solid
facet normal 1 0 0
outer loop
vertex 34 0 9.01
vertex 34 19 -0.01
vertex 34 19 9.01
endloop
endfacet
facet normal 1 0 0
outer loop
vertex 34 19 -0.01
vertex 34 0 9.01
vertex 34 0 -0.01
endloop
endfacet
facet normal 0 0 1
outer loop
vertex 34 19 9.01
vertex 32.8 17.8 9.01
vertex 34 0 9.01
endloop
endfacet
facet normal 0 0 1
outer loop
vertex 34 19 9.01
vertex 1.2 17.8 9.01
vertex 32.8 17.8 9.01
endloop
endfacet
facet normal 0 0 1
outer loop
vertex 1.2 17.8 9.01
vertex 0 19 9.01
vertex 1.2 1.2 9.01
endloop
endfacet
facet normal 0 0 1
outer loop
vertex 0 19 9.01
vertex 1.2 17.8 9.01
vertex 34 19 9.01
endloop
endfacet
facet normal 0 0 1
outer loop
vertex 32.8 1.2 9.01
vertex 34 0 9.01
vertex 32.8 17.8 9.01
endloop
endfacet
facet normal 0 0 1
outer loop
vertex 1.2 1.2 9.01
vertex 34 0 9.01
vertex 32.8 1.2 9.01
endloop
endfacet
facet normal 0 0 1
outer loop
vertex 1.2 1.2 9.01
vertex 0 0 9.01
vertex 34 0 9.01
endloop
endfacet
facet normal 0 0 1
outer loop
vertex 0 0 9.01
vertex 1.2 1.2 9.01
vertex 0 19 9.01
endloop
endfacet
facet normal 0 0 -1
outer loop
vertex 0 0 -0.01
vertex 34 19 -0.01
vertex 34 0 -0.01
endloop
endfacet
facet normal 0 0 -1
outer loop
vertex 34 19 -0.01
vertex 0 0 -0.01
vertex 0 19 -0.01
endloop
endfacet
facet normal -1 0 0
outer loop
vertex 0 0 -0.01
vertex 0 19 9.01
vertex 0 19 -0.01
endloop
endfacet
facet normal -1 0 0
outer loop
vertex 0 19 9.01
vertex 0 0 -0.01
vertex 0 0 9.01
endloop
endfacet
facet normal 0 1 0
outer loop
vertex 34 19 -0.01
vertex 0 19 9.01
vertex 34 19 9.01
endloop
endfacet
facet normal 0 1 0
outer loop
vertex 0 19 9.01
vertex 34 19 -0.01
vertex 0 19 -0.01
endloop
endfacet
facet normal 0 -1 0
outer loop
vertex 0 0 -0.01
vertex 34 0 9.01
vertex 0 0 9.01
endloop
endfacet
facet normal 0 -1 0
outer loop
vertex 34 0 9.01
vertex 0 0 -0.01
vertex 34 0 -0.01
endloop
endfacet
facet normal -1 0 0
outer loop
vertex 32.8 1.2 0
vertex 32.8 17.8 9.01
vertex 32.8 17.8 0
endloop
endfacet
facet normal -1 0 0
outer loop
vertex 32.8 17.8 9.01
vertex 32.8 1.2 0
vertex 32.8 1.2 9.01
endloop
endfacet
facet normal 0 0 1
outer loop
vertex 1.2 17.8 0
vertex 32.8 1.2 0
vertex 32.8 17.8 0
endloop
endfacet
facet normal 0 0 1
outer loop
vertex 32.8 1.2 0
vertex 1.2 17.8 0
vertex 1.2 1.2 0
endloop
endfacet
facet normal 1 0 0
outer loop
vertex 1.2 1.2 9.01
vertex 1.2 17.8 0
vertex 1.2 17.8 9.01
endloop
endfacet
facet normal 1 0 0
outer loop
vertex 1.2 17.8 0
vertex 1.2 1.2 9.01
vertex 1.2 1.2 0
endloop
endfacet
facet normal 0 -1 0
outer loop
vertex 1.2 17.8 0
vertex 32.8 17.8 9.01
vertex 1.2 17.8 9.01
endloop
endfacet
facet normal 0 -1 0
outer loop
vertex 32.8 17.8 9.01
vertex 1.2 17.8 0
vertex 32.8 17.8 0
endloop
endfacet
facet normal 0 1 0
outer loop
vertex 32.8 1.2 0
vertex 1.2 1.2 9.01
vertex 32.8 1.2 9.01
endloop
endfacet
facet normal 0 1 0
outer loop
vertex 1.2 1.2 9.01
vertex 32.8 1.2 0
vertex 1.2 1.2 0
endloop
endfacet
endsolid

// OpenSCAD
// file: ../Base/Boxes.scad
// Fischertechnik Box Foundation
// Pre-designed Boxes

use <Constants.scad>

include <PlacementOptions.scad>

box190Width = 190;
box190Depth = 130;
box130Width = 130;
box130Depth = 95;
boxUsageHeight = 33.9;
boxWallThickness = 2.4;
boxBaseThickness = 1.0;

// getBoxWallThickness()
// Gets the wall thickness of a Fischertechnik Box

function getBoxWallThickness() = boxWallThickness;

// Gets the usable height of a fischertechnik box
function getBoxUsageHeight() = boxUsageHeight;

// Gets the thickness of the Fischertechnik box base.
function getBoxBaseThickness() = boxBaseThickness;

// Gets the usable inner space of a Box 190 as an x/y-list
function getBox190Space() = [
    box190Width - 2*getBoxWallThickness(), 
    box190Depth - 2*getBoxWallThickness() ];

// Imports the Fischertechnik empty box 130x190 mm and places it at position 0,0
// 190x130 are the outer sizes, the inner space is slightly smaller. Use getBox190Space() to get the inner sizes.
// This module needs the STL file "Fischertechnik Box 130x190.stl" in the library path.
// The box is positioned that the usable inner space is at the 0,0,0 position. The

module Box190() {
    translate([-getBoxWallThickness(),-getBoxWallThickness(),-getBoxBaseThickness()])
        import("Fischertechnik Box 130x190.stl", convexity=3);
}

// Gets the usable inner space of a Box 130 as an x/y-list
function getBox130Space() = [
    box130Width - 2*getBoxWallThickness(), 
    box130Depth - 2*getBoxWallThickness() ];

// Imports the Fischertechnik empty box 95x130 mm and places it at position 0,0
// 190x130 are the outer sizes, the inner space is slightly smaller. Use getBox190Space() to get the inner sizes.
// This module needs the STL file "Fischertechnik Box 95x130.stl" in the library path.
// The box is positioned that the usable inner space is at the 0,0,0 position. The

module Box130() {
    translate([-getBoxWallThickness(),-getBoxWallThickness(),-getBoxBaseThickness()])
        import("Fischertechnik Box 95x130.stl", convexity=3);
}

// Creates a web at the specified box walls
// corner 0 = LowerLeft, 1 = UpperLeft, 2 = UpperRight, 3 = LowerRight
// side 0 = LeftOfCorner, 1 = RightOfCorner
// distance = Distance in mm from the corner
// box = inner width and depth of the box (default: Box 190)
// webWidth = length of the web (default is 3 mms)
// webThickness = thickness of the web (default is 1 mm)

module BoxWeb(corner, side, distance, box=getBox190Space(), webWidth=3, webThickness=1.0) {
    sink = getBoxWallThickness()/2;

    width = (corner % 2 == 0) ? 
            (side == LeftOfCorner ? webWidth : webThickness) :
            (side == LeftOfCorner ? webThickness : webWidth);

    depth = (corner % 2 == 0) ? 
            (side == RightOfCorner ? webWidth : webThickness) :
            (side == RightOfCorner ? webThickness : webWidth);
    
    xDiff = corner == LowerLeft ? 
                (side == LeftOfCorner ? -sink : distance) :
            (corner == UpperLeft ?                
                (side == LeftOfCorner ? distance : -sink) :
            (corner == UpperRight ?
                (side == LeftOfCorner ? box.x-webWidth+sink : box.x-distance-webThickness) :
                (side == LeftOfCorner ? box.x-distance-webThickness: box.x-webWidth+sink)));

    yDiff = corner == LowerLeft ? 
                (side == RightOfCorner ? -sink : distance) :
            (corner == UpperLeft ?
                (side == RightOfCorner ? box.y-distance : box.y-webWidth+sink) :
            (corner == UpperRight ?
                (side == RightOfCorner ? box.y-webWidth+sink : box.y-distance) :
                (side == RightOfCorner ? distance : -sink)));
    
    translate([xDiff, yDiff, -getExcess()])
        cube([width, depth, boxUsageHeight + 2*getExcess()]);
}
// file: ../Base/Rotation.scad
// Fischertechnik Box Foundation
// Geometry Helpers Rotation

include <PlacementOptions.scad>

// getRotatedSpace(space, rotation=NoRotation)
// Rotates the space dependent on the specified rotation

function getRotatedSpace(space, rotation=NoRotation) = [
    (rotation == Rotate90 || rotation == Rotate270) ? space.y : space.x,
    (rotation == Rotate90 || rotation == Rotate270) ? space.x : space.y
];

// Rotates the given space around the fixed left lower corner
// space = the space the children needs as width/depth list [width,depth]
// rotation = 0 Rotate0 degrees, 1 Rotate90 degrees, 2 Rotate180 degrees, 3 Rotate270 degrees (equivalent to -90)

module RotateFix(space, rotation=Rotate0) {
    dy = (rotation == Rotate0 || rotation == Rotate270) ? 0 :
        (rotation == Rotate90) ? space.x :
        space.y;
    dx = (rotation < Rotate180) ? 0 :
        (rotation == Rotate180) ? space.x :
        space.y;
    
    translate([dx, dy, 0])
        rotate([0, 0, rotations[rotation]])
            children();
}
// file: ../Base/Alignment.scad
// Fischertechnik Box Foundation
// Geometry Helpers Alignment

include <PlacementOptions.scad>

// getAlignedX(elementWidth, spaceWidth, align=AlignRight, offset=0)
// Gets the aligned X offset of an element with the given
// width in the given space.
// elementWidth = The width of the element to positon
// spaceWidth = The space where the element should be aligned
// align = 0 AlignLeft, 1 AlignCenter, 2 AlignRight
// offset = an optional offset from the aligned position. When
// aligned left or centered, then positive values are in X direction.
// When aligned right then positive values are in negative X direction.

function getAlignedX(elementWidth, spaceWidth, align=AlignRight, offset=0) =
    (align == AlignLeft) ?
        offset :
        ((align == AlignCenter) ?
        (spaceWidth - elementWidth)/2 + offset :
        spaceWidth - offset - elementWidth);

// getAlignedY(elementDepth, spaceDepth, align=AlignTop, offset=0)
// Gets the aligned Y offset of an element with the given
// depth in the given space.
// elementDepth = The depth of the element to positon
// spaceDepth = The space where the element should be aligned
// align = 0 AlignBottom, 1 AlignCenter, 2 AlignTop
// offset = an optional offset from the aligned position. When
// aligned bottom or centered, then positive values are in Y direction.
// When aligned top then positive values are in negative Y direction.

function getAlignedY(elementDepth, spaceDepth, align=AlignTop, offset=0) =
    (align == AlignBottom) ?
        offset :
        ((align == AlignCenter) ?
        (spaceDepth - elementDepth)/2 + offset :
        spaceDepth - offset - elementDepth);
// file: ../Base/PlacementOptions.scad
// Fischertechnik Box Foundation
// Placement Options

// Alignment
NoAlign = 0;
AlignLeft = 1;
AlignBottom = 2;
AlignCenter = 3;
AlignRight = 4;
AlignTop = 5;

// Element rotation degree steps
rotations = [0, -90, -180, -270];

// Rotation
NoRotation = 0;
Rotate0 = 0;
Rotate90 = 1;
Rotate180 = 2;
Rotate270 = 3;

// Docking (seen from above)
NoDock = -1;
DockLeft = 0;
DockTop = 1;
DockRight = 2;
DockCorner = 2;
DockBottom = 3;

// Web corners
LowerLeft = 0;
UpperLeft = 1;
UpperRight = 2;
LowerRight = 3;

// Web position relative to corner
LeftOfCorner = 0;
RightOfCorner = 1;
// file: ../Base/Placement.scad
// Fischertechnik Box Foundation
// Geometry Helpers Placement

use <Constants.scad>
use <Alignment.scad>
use <Rotation.scad>
use <Boxes.scad>

include <PlacementOptions.scad>

// Place(x=0, y=0, elementSpace=[0,0], alignX=AlignLeft, alignY=AlignBottom, rotation=Rotate0, boxSpace=getBox190Space())
// Places the child at the specified position
// y = Y-Position. This is a relative position when an X aligment is specified.
// x = X-Position. This is a relative position when an Y aligment is specified.
// elementSpace = space of the element to be placed [x,y]
// alignX = -1=NoAlign, 0 AlignLeft, 1 AlignCenter, 3 AlignRight (elementSpace and boxSpace required!)
// alignY = -1=NoAlign, 2 AlignBottom, 1 AlignCenter, 4 AlignTop (elementSpace and boxSpace required!)
// rotation = 0 Rotate0 0 degrees, 1 Rotate90 90 degrees, 
// 2 Rotate180 180 degrees, 3 Rotate270 270 degrees (equivalent to -90)
// boxSpace = Inner space of the box where the placement occurs [x,y] - default is Box 190x130 inner space

module Place(x=0, y=0, elementSpace=[0,0], 
  alignX=AlignLeft, alignY=AlignBottom, 
  rotation=NoRotation, boxSpace=getBox190Space()) {

    module Position(x, y, space, rotation=Rotate0) {
        translate([x, y, 0])
            RotateFix(space, rotation)
                children(0);
    }

    space = getRotatedSpace(elementSpace, rotation);
    alignedX = getAlignedX(space.x, boxSpace.x, alignX, x);
    alignedY = getAlignedY(space.y, boxSpace.y, alignY, y);
    Position(alignedX, alignedY, elementSpace, rotation)
        children(0);
}

// Center(space=getBox130Space(), elementSpace=[0,0])
// space = Space where the children is centered. For cylinder use centered=true and no elementSpace.
// elementSpace = space of the element to be centered [x,y]

module Center(space=getBox190Space(), elementSpace=[0,0]) {
    translate([(space.x - elementSpace.x) / 2, (space.y - elementSpace.y) / 2])
        children(0);
}

// CenterHorizontal(width=0, y=0, offset=0, space=getBox130Space())
// space = Space where the children is centered. For cylinder use centered=true and no elementSpace.
// elementSpace = space of the element to be centered [x,y]

module CenterHorizontal(width=0, y=0, offset=0, space=getBox190Space()) {
    translate([(space.x - width) / 2 + offset, y])
        children(0);
}

// CenterVertical(depth=0, x=0, offset=0, space=getBox130Space())
// space = Space where the children is centered. For cylinder use centered=true and no elementSpace.
// elementSpace = space of the element to be centered [x,y]

module CenterVerticalal(depth=0, x=0, offset=0, space=getBox190Space()) {
    translate([x, (space.y - depth) / 2 + offset])
        children(0);
}
// file: ../Base/Constants.scad
// Fischertechnik Box Foundation
// Constants

// Constant values necessary for multiple elements

// Base constants
dividerThickness = 1.2;
excess = 0.01;
fragments = 90;
tolerance = 0.8;

// Gets the thickness of a divider 
function getDividerThickness() = dividerThickness;

// Gets the excess that is used to merge walls into each other
function getExcess() = excess;

// Gets amount of fragments of a cylinder
function getFragments() = fragments;

// Gets the inner tolerance of a frame to each side
function getTolerance() = tolerance;


// Fischertechnik specific constants
axisDiameter = 4;
axisBottomDiameter = axisDiameter + 1;
standardEdgeDistance = 2.5;
standardWebDistance = 11.5;
standardCornerLength = 15;
tubeWallFactor = 1.6;

// Gets axis diameter
function getAxisDiameter() = axisDiameter;

// Gets axis bottom diameter for thicker part at the bottom
function getAxisBottomDiameter() = axisBottomDiameter;

// gets the standard distance to the wall of the box for dockable frames with webs
function getStandardEdgeDistance() = standardEdgeDistance;

// gets the standard distance of each web to the corner of the dockable frame
function getStandardWebDistance() = standardWebDistance;

// gets the standard length of the corner walls of a dockable frame
function getStandardCornerLength() = standardCornerLength;

// gets the wall thickness of a tube.
function getTubeWallThickness() = tubeWallFactor * getDividerThickness();
// main file
// Fischertechnik Box Library
// Frame for equilateral angle blocks
// 31010

use <../Base/Constants.scad>
use <../ModelBase/Simple.scad>

width = 15;
depth = 15;
height = 9;

// getFrameAngleEquilateralSpace
// Gets the space the frame angle equilateral needs for count blocks as width and depth (.x and .y as a list)
// count = Count of equilateral angle blocks

function getFrameAngleEquilateralSpace(count=1) = getFrameOuterVolume([width * count, depth, height]);
/*[
    frameGridWidth * count + 2 * getWallThickness() + getTolerance(), 
    frameGridDepth + 2 * getWallThickness() + getFrameInnerGap()];*/

// FrameAngleEquilateral(count)
// count = Count of angle blocks in x direction
// The walls of the frame are 9 mm high.
// The complete frame has a tolerance of addition 1 mm in each direction.

module FrameAngleEquilateral(count=1) {
    innerVolume = getFrameInnerVolume([width * count, depth, height]);
    Frame(innerVolume);
}

// Tests
color ("lightgray")
FrameAngleEquilateral(2);
